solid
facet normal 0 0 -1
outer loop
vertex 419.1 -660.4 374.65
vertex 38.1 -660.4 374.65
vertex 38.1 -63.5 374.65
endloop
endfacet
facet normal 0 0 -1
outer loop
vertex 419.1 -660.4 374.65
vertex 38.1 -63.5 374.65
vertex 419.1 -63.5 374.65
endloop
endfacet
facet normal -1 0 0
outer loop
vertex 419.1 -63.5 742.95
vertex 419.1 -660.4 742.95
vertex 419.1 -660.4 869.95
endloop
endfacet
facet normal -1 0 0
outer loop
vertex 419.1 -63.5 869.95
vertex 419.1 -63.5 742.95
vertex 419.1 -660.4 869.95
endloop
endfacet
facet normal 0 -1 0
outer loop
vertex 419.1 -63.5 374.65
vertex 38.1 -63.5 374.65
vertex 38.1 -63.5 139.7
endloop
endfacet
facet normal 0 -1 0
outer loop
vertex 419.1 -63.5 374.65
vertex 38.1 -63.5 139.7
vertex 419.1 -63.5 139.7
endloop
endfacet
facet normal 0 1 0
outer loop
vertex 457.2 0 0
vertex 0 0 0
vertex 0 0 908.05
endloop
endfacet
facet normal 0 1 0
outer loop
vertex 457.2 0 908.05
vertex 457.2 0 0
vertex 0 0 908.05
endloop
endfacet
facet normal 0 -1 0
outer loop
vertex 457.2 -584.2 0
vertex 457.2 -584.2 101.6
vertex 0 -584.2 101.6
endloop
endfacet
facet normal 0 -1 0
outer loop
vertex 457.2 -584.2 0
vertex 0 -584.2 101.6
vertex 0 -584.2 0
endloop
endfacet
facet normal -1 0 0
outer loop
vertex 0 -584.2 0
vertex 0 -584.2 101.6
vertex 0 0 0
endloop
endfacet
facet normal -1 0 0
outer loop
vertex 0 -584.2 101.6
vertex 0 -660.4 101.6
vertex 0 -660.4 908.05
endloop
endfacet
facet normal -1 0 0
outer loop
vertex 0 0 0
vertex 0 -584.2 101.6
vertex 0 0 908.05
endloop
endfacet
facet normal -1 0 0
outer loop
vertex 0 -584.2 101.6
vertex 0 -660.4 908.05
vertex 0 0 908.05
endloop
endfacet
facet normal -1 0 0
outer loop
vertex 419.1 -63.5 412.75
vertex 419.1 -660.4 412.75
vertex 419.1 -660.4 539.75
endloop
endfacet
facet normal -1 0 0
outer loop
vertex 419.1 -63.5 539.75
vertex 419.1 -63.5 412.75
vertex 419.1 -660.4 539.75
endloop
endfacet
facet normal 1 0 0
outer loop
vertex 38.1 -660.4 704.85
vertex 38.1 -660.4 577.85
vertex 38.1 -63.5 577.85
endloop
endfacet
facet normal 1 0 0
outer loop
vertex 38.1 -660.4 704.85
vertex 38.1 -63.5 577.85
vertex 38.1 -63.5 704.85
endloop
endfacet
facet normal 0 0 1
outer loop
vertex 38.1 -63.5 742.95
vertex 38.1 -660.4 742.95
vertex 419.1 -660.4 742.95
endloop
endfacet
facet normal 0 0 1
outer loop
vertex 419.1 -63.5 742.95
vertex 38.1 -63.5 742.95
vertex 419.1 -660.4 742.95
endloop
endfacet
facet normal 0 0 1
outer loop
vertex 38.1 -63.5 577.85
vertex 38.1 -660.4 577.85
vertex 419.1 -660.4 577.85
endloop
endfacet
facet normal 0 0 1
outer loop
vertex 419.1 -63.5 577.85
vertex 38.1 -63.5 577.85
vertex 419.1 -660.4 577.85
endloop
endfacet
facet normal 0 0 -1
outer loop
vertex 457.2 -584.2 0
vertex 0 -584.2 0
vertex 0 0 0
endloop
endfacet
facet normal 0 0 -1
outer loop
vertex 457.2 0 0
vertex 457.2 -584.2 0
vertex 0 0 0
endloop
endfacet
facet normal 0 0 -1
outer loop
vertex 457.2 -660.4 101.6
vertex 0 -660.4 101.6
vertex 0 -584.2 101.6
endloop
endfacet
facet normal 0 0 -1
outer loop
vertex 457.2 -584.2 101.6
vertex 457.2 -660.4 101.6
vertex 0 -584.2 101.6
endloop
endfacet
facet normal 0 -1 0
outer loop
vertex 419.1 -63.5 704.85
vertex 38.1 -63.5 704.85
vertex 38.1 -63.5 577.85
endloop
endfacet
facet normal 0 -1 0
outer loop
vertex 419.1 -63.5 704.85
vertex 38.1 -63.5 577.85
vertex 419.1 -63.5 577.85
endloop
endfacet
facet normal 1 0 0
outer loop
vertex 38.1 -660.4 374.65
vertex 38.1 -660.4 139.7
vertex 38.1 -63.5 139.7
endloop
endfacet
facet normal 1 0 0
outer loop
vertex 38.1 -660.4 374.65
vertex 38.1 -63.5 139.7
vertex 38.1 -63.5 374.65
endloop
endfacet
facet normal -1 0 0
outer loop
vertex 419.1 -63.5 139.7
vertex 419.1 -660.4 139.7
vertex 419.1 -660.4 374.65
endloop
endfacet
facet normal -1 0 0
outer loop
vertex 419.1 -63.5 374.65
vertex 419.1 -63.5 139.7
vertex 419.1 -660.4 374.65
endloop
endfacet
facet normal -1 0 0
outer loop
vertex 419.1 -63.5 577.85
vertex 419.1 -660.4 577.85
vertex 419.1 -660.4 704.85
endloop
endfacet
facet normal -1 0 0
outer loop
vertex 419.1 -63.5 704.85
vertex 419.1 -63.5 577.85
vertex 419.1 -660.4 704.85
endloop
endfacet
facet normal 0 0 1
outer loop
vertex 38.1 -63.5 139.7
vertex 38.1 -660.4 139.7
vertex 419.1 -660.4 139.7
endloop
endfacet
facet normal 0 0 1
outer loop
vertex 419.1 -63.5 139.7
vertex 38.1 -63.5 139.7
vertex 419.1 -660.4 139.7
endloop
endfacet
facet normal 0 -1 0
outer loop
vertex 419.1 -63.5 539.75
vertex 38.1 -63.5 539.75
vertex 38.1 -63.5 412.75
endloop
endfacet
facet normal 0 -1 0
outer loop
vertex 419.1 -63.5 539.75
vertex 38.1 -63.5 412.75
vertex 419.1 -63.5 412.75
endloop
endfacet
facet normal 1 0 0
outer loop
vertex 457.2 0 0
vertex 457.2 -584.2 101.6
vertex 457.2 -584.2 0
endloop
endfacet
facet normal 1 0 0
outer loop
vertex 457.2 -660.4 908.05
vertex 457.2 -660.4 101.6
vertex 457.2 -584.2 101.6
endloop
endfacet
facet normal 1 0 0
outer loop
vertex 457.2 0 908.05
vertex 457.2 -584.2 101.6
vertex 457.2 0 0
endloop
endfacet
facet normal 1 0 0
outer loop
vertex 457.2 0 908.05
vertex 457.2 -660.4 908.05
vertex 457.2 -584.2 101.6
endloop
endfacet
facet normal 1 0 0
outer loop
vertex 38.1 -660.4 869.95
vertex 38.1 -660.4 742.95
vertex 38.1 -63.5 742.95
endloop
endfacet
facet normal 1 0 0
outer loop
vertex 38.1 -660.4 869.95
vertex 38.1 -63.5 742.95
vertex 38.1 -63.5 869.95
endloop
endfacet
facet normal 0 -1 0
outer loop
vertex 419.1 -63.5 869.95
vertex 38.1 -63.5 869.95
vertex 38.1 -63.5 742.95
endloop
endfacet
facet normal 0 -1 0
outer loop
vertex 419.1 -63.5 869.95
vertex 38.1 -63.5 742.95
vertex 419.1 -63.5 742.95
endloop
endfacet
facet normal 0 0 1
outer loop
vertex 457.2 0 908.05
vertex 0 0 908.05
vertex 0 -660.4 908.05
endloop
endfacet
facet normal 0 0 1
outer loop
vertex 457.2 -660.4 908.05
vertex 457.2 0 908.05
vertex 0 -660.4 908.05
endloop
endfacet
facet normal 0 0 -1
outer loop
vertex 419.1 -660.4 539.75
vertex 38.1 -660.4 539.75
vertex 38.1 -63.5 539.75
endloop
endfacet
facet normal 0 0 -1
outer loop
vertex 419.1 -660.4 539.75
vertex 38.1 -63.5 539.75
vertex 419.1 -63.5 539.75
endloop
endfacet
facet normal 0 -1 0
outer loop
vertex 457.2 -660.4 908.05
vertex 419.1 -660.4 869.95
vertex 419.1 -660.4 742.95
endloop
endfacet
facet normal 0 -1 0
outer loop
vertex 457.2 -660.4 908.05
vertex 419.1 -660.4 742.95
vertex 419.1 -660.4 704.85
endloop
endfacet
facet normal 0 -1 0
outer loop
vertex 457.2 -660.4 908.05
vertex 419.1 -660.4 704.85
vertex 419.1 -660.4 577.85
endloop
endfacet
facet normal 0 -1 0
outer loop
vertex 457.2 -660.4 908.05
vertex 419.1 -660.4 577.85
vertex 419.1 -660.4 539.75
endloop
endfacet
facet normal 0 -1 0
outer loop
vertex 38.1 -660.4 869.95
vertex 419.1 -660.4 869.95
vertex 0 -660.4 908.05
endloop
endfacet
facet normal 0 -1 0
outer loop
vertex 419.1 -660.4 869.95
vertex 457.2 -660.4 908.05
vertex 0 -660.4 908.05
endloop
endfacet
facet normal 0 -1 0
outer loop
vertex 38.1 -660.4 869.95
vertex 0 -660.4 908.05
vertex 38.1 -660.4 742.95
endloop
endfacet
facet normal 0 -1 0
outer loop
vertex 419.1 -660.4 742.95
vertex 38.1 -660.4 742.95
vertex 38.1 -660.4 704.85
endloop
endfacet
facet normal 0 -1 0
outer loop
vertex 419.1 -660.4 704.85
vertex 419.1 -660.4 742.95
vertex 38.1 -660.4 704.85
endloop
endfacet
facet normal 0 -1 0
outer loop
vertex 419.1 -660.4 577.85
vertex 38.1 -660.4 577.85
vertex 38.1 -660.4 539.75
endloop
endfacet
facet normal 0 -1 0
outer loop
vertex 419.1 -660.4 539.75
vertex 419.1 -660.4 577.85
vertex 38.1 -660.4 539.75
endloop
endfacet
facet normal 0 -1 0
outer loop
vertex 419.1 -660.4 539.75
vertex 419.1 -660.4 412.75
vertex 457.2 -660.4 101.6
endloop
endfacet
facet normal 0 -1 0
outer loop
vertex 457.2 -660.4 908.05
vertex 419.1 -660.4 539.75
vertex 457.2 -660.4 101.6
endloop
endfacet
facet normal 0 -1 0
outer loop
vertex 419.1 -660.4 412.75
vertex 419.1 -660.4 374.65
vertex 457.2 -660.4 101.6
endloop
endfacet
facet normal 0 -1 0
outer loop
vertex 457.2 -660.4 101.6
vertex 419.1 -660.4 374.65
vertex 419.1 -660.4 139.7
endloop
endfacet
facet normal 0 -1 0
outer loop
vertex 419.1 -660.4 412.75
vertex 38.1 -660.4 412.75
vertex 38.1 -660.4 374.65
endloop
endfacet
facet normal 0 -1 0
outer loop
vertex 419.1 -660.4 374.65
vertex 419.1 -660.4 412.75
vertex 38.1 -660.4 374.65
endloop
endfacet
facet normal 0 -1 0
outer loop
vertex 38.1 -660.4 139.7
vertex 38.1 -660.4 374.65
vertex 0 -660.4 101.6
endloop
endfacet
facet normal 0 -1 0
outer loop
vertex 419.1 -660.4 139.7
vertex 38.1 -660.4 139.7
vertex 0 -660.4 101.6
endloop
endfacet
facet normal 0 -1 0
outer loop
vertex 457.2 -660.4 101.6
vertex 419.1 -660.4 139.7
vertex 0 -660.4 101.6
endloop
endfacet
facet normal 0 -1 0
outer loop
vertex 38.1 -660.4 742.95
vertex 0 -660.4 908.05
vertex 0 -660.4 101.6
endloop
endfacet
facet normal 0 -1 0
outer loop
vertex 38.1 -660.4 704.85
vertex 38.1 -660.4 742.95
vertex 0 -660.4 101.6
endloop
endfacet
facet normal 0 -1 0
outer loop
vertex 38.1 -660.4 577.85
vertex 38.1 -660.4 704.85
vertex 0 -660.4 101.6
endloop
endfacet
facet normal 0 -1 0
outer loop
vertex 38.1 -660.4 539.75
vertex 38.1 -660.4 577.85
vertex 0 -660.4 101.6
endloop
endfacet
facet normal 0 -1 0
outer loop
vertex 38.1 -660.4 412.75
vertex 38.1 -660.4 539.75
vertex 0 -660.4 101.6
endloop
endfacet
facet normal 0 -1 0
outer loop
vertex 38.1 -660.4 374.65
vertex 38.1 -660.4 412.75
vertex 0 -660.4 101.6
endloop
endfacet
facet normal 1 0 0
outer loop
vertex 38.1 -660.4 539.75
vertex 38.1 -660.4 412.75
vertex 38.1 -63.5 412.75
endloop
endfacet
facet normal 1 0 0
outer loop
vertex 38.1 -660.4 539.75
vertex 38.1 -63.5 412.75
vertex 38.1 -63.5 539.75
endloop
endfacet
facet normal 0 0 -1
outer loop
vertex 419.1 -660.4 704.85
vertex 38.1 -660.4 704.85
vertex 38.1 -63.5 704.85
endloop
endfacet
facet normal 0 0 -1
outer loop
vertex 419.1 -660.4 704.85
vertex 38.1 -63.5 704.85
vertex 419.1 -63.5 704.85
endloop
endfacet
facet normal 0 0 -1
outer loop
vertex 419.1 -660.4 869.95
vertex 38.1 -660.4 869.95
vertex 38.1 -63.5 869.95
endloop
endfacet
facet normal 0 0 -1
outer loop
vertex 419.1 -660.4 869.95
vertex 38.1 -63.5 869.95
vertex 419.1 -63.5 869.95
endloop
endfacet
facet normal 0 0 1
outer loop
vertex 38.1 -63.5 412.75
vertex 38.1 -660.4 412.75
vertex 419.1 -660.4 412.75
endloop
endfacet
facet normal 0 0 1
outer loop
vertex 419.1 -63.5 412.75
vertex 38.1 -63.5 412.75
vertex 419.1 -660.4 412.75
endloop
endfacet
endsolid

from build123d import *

# Parameters (mm, degrees)
F1_DEPTH = 457.2
F2_W     = 381
F2_H     = 127
F2_H_2   = 234.95
F3_DEPTH = 596.9


with BuildPart() as f1:
    # F0 (on Right) → F1 (new body)
    with BuildSketch(Plane.YZ):
        Polygon((-584.2, 0), (0, 0), (0, 908.05), (-660.4, 908.05), (-660.4, 101.6), (-584.2, 101.6), align=None)
    extrude(amount=F1_DEPTH)

    # F2 (on face) → F3 (cut)
    with BuildSketch(Plane.XZ.offset(660.4)):
        with Locations((228.6, 806.45)):
            Rectangle(F2_W, F2_H)
        with Locations((228.6, 641.35)):
            Rectangle(F2_W, F2_H)
        with Locations((228.6, 476.25)):
            Rectangle(F2_W, F2_H)
        with Locations((228.6, 257.175)):
            Rectangle(F2_W, F2_H_2)
    extrude(amount=-F3_DEPTH, mode=Mode.SUBTRACT)


solid = f1.part
